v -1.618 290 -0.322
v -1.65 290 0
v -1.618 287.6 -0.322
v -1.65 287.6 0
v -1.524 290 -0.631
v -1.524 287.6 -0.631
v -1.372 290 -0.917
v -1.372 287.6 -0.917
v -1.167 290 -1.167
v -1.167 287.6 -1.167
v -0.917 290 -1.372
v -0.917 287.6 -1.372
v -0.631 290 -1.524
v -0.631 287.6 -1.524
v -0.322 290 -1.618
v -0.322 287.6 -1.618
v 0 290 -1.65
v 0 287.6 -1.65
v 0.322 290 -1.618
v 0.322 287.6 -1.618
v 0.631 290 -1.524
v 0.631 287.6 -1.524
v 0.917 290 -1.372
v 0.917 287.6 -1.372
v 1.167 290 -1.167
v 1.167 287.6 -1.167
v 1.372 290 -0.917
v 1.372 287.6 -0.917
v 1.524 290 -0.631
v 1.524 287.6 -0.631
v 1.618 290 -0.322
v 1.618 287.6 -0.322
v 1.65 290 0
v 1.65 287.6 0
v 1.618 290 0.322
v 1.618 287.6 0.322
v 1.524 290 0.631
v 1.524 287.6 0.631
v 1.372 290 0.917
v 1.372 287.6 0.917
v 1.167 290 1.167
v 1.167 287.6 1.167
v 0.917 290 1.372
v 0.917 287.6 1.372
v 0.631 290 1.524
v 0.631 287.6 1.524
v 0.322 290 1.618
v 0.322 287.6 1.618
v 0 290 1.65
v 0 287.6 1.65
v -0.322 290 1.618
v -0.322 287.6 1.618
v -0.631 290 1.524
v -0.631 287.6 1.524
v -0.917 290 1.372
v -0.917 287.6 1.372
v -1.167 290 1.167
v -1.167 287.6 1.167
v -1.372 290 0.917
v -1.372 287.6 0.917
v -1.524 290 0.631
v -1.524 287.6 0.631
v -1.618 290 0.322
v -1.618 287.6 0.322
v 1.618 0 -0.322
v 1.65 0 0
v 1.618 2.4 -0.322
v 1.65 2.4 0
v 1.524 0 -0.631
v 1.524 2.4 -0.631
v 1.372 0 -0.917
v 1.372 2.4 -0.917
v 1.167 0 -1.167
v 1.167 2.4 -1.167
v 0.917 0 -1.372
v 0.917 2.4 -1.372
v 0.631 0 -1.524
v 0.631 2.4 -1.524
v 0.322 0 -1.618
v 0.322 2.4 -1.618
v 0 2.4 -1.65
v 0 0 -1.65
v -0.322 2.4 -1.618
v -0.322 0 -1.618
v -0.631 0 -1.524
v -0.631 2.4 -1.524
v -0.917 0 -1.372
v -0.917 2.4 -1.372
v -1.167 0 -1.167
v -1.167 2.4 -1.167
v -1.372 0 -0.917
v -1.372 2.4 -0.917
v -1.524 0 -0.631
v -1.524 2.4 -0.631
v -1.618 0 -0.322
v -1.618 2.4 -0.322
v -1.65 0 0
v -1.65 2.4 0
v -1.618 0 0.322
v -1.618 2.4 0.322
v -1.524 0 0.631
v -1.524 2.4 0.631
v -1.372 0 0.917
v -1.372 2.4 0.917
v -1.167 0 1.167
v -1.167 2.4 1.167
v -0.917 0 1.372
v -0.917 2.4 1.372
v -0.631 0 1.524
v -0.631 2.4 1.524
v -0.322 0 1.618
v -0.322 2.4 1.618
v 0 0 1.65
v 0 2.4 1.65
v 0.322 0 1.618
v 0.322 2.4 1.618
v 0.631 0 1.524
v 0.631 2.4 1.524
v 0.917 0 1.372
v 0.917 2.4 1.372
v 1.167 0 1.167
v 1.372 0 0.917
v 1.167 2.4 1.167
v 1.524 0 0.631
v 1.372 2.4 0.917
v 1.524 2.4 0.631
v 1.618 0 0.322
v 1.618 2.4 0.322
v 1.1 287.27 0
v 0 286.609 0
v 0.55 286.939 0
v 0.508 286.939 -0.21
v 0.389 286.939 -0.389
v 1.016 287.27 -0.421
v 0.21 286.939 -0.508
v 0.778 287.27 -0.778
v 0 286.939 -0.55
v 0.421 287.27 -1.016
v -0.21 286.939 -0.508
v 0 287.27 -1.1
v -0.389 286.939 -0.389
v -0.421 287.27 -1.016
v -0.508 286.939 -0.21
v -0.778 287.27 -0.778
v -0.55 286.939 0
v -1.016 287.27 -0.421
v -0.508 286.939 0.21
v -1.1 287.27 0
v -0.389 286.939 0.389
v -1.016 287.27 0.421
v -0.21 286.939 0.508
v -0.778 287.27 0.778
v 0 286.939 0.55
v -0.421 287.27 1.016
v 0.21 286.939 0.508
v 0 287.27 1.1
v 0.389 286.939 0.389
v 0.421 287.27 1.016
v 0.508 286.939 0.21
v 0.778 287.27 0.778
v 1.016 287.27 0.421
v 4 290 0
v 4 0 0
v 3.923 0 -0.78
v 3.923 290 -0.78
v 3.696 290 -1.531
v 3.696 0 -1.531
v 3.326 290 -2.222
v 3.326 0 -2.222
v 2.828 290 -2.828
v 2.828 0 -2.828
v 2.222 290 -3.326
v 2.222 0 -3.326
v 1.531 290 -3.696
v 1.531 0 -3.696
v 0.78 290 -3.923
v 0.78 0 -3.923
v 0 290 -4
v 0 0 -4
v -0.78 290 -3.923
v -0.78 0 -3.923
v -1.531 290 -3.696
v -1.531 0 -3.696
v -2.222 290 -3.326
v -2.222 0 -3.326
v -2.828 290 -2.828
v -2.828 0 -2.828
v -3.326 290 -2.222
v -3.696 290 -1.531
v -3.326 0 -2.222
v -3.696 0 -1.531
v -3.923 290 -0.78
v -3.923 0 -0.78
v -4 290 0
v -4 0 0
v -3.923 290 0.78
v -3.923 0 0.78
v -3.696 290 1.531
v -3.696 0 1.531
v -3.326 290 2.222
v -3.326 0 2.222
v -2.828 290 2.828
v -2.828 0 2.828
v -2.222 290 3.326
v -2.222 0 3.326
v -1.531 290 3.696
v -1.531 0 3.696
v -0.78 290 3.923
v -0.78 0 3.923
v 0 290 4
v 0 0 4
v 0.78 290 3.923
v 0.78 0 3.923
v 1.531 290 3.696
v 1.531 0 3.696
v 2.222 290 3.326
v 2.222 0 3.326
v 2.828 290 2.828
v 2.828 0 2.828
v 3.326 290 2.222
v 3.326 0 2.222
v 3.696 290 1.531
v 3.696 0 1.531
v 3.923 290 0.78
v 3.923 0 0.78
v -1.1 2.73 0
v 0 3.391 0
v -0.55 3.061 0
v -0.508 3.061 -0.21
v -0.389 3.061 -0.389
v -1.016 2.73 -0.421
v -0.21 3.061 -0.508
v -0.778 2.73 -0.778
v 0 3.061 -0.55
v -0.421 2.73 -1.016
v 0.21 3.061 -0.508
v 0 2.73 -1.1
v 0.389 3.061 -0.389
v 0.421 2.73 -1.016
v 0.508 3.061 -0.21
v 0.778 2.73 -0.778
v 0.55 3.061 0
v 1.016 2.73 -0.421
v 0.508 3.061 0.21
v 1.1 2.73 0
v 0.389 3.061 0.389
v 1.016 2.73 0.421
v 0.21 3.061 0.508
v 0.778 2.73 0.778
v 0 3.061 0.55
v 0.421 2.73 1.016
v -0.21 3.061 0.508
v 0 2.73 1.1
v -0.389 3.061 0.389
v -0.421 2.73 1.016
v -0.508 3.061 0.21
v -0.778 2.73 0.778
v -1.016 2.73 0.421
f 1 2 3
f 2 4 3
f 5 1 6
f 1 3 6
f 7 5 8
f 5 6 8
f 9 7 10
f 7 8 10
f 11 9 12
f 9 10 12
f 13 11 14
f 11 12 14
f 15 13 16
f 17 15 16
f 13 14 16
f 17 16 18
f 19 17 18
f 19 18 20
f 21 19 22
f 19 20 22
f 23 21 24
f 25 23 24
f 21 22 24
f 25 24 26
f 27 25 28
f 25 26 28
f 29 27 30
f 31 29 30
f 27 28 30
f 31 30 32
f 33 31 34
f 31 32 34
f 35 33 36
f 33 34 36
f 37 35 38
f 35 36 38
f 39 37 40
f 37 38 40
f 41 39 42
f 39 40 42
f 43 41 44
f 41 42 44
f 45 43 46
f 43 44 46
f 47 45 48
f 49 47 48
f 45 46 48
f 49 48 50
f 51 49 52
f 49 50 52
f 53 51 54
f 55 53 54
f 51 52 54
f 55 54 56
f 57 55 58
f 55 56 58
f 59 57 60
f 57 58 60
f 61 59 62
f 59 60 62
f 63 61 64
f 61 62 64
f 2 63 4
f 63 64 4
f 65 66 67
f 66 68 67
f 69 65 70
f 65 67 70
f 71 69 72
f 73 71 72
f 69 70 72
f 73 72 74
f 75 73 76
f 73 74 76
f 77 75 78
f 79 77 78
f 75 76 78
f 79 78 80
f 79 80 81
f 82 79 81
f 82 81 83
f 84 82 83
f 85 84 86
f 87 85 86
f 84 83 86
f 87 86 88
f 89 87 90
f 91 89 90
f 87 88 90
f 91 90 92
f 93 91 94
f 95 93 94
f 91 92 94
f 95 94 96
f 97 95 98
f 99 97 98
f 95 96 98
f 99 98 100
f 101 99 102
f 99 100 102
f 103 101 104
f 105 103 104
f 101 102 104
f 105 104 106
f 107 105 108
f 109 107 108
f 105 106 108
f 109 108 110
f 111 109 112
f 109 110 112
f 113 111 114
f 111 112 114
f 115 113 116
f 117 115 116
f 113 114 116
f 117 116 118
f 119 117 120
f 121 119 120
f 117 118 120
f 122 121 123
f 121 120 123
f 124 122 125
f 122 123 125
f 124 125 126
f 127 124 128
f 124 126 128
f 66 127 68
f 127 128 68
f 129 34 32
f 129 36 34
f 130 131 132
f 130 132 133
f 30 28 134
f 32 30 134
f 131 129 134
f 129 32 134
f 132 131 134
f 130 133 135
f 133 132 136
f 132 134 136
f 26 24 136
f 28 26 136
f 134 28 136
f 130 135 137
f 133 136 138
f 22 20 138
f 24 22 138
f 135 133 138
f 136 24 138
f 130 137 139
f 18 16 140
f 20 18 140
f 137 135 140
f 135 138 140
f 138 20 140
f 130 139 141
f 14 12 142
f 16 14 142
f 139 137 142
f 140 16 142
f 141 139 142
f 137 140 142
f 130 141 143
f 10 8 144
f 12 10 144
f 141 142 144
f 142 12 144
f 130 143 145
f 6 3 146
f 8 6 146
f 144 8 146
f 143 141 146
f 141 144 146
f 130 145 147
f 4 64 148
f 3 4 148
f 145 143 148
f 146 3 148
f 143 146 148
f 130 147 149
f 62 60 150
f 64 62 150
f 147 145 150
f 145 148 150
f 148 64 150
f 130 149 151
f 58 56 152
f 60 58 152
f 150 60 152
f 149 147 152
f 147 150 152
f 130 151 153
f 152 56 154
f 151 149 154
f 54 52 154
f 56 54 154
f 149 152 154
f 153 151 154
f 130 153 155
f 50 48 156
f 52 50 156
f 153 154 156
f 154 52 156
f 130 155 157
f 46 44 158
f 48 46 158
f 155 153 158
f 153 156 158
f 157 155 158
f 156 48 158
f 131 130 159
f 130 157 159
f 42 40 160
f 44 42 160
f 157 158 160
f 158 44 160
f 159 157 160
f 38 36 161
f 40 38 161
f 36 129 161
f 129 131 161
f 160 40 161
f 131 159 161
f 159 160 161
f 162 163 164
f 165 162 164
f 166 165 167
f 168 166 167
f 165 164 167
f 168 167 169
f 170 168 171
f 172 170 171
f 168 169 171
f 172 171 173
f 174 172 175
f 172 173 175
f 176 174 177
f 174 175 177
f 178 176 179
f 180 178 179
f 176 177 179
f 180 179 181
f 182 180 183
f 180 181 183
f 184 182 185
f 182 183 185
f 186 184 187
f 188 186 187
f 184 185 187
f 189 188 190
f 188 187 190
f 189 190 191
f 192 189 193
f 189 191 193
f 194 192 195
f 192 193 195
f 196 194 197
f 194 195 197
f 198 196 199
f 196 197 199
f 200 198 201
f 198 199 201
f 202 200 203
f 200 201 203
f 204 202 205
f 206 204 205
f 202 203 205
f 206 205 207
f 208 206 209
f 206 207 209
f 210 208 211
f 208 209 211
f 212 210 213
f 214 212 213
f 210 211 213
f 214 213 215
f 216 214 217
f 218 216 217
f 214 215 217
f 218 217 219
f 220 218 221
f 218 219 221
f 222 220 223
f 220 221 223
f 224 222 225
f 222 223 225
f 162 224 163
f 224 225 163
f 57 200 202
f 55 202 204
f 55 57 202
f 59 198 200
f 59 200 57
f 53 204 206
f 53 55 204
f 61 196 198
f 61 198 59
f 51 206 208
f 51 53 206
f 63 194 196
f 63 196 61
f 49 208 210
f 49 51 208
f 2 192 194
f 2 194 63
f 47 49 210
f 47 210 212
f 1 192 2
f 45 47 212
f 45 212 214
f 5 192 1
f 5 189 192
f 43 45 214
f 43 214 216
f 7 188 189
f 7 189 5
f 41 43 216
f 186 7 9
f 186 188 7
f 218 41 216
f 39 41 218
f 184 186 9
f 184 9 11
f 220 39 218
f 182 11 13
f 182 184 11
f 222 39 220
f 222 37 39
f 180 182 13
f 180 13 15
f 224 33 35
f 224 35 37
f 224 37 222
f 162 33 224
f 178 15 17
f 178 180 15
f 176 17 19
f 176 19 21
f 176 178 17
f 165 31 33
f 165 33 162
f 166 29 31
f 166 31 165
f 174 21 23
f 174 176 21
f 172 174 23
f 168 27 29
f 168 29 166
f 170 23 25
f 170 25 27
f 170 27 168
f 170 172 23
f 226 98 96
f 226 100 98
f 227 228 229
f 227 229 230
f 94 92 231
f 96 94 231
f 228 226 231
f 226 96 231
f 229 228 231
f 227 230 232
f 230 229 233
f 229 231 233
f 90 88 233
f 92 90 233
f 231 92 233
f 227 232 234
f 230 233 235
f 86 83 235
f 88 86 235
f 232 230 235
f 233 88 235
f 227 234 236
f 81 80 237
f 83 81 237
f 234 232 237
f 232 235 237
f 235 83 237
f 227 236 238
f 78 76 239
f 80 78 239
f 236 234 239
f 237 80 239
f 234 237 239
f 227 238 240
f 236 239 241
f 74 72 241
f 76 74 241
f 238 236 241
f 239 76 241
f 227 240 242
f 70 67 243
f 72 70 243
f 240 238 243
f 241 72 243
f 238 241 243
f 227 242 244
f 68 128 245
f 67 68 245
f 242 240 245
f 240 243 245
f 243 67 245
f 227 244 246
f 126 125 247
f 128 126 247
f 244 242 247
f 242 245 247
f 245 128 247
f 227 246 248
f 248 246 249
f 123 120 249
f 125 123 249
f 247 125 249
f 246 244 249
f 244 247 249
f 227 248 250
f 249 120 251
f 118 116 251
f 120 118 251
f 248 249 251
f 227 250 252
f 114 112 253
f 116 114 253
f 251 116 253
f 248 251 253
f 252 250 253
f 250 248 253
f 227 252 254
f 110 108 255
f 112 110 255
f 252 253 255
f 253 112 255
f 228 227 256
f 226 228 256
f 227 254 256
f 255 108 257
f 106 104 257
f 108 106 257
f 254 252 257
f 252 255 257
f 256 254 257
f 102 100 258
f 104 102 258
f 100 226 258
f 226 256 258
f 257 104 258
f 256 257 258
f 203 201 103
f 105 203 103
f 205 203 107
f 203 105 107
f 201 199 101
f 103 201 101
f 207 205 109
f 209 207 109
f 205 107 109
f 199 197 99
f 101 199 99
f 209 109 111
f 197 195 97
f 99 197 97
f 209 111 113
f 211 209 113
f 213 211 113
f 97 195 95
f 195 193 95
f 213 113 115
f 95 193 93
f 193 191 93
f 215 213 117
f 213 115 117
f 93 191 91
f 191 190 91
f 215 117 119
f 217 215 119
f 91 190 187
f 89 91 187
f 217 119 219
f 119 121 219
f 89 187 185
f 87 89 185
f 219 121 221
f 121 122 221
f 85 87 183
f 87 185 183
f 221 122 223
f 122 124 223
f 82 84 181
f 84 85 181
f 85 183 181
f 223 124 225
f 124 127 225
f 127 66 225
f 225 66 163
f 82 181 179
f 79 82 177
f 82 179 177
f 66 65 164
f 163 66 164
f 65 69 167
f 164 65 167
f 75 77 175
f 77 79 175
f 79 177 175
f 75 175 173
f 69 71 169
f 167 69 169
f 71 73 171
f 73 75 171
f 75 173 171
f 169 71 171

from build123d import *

# Parameters (mm, degrees)
SKETCH3_R             = 4
BOSS_EXTRUDE1_DEPTH   = 290
M4_TAPPED_HOLE1_D     = 3.3
M4_TAPPED_HOLE1_DEPTH = 2.4
M4_TAPPED_HOLE1_TIP   = 0.991420021
M4_TAPPED_HOLE2_D     = 3.3
M4_TAPPED_HOLE2_DEPTH = 2.4
M4_TAPPED_HOLE2_TIP   = 0.991420021


with BuildPart() as part:
    # Sketch3 → Boss-Extrude1 (new body)
    with BuildSketch(Plane(origin=(0, 0, 0), x_dir=(1, 0, 0), z_dir=(0, 1, 0))):
        Circle(SKETCH3_R)
    extrude(amount=BOSS_EXTRUDE1_DEPTH)

    # M4 Tapped Hole1
    with Locations(Plane(origin=(0, 290, 0), x_dir=(1, 0, 0), z_dir=(0, 1, 0))):
        with Locations((0, 0)):
            Hole(M4_TAPPED_HOLE1_D / 2, depth=M4_TAPPED_HOLE1_DEPTH)
            with Locations((0, 0, -(M4_TAPPED_HOLE1_DEPTH + M4_TAPPED_HOLE1_TIP / 2))):  # 118° drill point
                Cone(0, M4_TAPPED_HOLE1_D / 2, M4_TAPPED_HOLE1_TIP, mode=Mode.SUBTRACT)

    # M4 Tapped Hole2
    with Locations(Plane(origin=(0, 0, 0), x_dir=(-1, 0, 0), z_dir=(0, -1, 0))):
        with Locations((0, 0)):
            Hole(M4_TAPPED_HOLE2_D / 2, depth=M4_TAPPED_HOLE2_DEPTH)
            with Locations((0, 0, -(M4_TAPPED_HOLE2_DEPTH + M4_TAPPED_HOLE2_TIP / 2))):  # 118° drill point
                Cone(0, M4_TAPPED_HOLE2_D / 2, M4_TAPPED_HOLE2_TIP, mode=Mode.SUBTRACT)


solid = part.part
